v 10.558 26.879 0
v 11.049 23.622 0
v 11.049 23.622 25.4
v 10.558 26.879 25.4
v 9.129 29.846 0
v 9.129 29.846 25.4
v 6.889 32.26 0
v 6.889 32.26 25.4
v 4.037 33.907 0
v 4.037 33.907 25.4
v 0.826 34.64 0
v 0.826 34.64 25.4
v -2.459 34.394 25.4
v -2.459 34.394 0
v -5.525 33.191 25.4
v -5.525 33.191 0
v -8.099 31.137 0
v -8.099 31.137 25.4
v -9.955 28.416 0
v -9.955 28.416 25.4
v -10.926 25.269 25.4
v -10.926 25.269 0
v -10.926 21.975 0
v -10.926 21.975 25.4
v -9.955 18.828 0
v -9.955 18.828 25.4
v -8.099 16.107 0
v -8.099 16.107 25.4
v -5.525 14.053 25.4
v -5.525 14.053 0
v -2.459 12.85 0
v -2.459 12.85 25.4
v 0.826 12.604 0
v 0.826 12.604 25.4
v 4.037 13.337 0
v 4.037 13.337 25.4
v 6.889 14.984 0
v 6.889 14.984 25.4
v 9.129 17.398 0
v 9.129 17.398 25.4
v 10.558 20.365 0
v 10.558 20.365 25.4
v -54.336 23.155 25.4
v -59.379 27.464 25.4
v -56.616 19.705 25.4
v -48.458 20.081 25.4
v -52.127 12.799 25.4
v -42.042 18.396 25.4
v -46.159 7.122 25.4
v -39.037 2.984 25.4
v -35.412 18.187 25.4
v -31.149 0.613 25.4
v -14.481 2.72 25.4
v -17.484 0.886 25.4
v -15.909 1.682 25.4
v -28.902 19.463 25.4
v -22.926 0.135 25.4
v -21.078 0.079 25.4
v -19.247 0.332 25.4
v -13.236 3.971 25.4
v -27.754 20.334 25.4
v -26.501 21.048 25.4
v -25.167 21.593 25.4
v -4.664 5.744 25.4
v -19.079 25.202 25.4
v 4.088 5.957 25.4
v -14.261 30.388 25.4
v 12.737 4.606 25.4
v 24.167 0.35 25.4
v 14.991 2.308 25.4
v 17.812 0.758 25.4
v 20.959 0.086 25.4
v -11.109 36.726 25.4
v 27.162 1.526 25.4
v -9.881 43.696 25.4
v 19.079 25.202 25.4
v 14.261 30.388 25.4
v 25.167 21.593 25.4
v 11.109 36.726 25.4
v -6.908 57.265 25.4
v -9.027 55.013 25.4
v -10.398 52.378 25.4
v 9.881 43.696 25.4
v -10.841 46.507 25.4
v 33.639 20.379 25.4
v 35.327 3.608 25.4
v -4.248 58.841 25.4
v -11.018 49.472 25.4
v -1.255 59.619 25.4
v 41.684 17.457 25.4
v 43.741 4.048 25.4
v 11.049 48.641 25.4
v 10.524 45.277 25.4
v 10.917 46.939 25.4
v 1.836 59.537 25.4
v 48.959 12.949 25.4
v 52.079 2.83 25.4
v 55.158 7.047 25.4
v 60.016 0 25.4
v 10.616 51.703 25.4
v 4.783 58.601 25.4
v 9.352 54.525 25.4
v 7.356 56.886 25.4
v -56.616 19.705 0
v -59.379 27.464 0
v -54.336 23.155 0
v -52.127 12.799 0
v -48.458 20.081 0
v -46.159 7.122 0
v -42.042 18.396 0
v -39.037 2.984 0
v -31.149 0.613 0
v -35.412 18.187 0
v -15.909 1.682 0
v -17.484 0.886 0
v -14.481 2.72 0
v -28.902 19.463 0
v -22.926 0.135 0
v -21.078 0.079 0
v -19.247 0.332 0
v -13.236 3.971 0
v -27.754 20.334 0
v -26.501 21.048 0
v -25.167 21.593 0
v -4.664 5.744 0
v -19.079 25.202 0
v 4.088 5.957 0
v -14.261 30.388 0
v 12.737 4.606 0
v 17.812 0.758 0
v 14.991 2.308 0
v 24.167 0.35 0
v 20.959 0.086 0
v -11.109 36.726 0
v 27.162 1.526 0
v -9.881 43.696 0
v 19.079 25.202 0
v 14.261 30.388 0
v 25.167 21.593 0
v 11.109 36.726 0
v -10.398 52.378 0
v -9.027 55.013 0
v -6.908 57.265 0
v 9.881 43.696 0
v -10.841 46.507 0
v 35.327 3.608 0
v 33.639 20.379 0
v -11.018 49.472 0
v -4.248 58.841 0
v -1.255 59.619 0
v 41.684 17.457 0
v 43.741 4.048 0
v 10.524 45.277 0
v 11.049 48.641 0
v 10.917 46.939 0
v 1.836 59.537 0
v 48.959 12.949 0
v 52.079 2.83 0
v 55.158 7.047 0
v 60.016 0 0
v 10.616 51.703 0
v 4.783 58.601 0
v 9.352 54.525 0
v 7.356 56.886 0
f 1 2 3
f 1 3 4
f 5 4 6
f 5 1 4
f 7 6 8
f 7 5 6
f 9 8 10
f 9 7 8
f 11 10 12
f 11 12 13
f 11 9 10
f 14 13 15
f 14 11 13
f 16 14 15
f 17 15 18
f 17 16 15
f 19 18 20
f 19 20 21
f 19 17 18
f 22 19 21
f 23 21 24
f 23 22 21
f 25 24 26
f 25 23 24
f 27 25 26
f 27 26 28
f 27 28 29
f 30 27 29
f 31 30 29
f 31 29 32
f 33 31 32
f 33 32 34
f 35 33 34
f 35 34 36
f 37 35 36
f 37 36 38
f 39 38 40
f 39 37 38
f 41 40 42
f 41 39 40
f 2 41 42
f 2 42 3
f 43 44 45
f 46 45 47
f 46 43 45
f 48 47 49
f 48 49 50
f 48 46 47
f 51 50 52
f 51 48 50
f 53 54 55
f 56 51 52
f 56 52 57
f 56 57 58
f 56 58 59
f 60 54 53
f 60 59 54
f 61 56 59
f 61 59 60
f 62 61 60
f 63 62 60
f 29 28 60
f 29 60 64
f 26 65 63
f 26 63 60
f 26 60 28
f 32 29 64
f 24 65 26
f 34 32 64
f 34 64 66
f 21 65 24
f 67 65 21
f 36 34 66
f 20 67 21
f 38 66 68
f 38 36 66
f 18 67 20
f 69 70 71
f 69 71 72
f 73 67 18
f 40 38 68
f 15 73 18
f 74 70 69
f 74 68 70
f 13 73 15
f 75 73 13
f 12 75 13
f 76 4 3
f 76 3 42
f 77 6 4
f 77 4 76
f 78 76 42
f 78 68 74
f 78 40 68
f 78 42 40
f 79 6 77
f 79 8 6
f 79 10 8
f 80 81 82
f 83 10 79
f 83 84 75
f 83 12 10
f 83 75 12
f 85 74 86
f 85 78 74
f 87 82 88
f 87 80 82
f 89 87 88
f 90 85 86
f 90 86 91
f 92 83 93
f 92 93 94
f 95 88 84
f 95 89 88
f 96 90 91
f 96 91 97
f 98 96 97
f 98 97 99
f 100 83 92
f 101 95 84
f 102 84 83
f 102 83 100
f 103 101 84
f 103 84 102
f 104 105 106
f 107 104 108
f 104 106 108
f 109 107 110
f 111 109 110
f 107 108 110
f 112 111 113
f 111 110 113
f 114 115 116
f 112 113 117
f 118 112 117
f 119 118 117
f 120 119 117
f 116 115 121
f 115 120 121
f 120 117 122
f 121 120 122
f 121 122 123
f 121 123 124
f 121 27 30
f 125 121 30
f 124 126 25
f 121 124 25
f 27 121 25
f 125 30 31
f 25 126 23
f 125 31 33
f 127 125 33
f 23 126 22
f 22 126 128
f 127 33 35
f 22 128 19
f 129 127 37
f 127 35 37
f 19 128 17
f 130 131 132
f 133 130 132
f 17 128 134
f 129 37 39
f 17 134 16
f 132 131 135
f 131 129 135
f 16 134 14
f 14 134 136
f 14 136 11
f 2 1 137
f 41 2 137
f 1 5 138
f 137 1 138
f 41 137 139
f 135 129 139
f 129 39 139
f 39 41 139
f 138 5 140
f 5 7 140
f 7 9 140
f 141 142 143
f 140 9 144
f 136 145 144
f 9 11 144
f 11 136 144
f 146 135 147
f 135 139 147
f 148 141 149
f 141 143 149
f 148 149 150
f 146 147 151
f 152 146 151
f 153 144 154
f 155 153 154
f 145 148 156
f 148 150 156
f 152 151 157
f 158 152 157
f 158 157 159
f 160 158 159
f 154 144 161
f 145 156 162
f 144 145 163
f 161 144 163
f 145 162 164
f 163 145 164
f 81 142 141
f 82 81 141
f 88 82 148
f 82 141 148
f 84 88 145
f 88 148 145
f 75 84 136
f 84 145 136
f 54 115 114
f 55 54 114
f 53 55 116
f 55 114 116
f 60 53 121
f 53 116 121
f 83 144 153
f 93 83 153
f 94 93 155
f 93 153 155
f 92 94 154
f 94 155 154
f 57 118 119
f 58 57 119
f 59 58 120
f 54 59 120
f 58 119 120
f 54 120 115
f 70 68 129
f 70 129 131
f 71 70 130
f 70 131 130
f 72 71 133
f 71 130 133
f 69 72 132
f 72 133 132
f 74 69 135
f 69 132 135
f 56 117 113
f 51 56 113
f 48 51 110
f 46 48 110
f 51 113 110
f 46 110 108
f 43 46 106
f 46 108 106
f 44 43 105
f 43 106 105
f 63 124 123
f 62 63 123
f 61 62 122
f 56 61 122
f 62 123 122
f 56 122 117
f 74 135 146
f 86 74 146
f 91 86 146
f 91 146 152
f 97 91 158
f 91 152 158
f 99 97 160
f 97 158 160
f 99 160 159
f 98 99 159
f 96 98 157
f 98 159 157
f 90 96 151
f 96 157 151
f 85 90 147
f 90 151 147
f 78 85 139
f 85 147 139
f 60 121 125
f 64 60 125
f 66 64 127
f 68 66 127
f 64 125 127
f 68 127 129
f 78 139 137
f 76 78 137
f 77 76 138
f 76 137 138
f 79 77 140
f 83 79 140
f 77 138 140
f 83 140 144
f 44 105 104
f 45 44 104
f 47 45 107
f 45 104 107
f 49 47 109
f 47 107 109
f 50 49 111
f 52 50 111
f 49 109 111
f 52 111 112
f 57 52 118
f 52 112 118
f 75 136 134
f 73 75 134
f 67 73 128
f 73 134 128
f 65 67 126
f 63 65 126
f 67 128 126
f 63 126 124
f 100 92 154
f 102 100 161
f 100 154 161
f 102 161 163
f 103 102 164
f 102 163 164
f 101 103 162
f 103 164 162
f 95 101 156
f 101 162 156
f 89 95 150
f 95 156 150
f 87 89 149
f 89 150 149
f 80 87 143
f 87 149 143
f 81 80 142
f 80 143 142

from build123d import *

# Parameters (mm, degrees)
F0_R     = 11.049
F1_DEPTH = 25.4


with BuildPart() as f1:
    # F0 (on Top) → F1 (new body)
    with BuildSketch(Plane.XY):
        with BuildLine():
            ThreePointArc((9.880516, 43.696073), (10.752912, 46.100628), (11.049, 48.641354))
            ThreePointArc((11.049, 48.641354), (3.342308, 59.172706), (-9.026913, 55.012794))
            ThreePointArc((-9.026913, 55.012794), (-11.017702, 49.472403), (-9.880516, 43.696073))
            ThreePointArc((-9.880516, 43.696073), (0, 37.592354), (9.880516, 43.696073))
        make_face()
        with BuildLine():
            ThreePointArc((25.166727, 21.592547), (14.261351, 30.388211), (9.880516, 43.696073))
            ThreePointArc((9.880516, 43.696073), (0, 37.592354), (-9.880516, 43.696073))
            ThreePointArc((-9.880516, 43.696073), (-14.261351, 30.388211), (-25.166727, 21.592547))
            ThreePointArc((-25.166727, 21.592547), (-15.209211, 20.07738), (-10.618396, 11.112323))
            ThreePointArc((-10.618396, 11.112323), (-11.293541, 7.309228), (-13.236467, 3.970907))
            ThreePointArc((-13.236467, 3.970907), (-0.292561, 6.046929), (12.737323, 4.60585))
            ThreePointArc((12.737323, 4.60585), (12.750546, 17.636907), (25.166727, 21.592547))
        make_face()
        with Locations((0, 23.622)):
            Circle(F0_R, mode=Mode.SUBTRACT)
        with BuildLine():
            ThreePointArc((60.015514, 0), (45.437915, 15.390791), (25.166727, 21.592547))
            ThreePointArc((25.166727, 21.592547), (30.632453, 17.570508), (32.716396, 11.112323))
            ThreePointArc((32.716396, 11.112323), (31.227516, 5.572963), (27.162137, 1.526488))
            ThreePointArc((27.162137, 1.526488), (43.741463, 4.048326), (60.015514, 0))
        make_face()
        with BuildLine():
            ThreePointArc((32.716396, 11.112323), (30.632453, 17.570508), (25.166727, 21.592547))
            ThreePointArc((25.166727, 21.592547), (12.750546, 17.636907), (12.737323, 4.60585))
            ThreePointArc((12.737323, 4.60585), (19.360668, 0.306796), (27.162137, 1.526488))
            ThreePointArc((27.162137, 1.526488), (31.227516, 5.572963), (32.716396, 11.112323))
        make_face()
        with BuildLine():
            ThreePointArc((-10.618396, 11.112323), (-15.209211, 20.07738), (-25.166727, 21.592547))
            ThreePointArc((-25.166727, 21.592547), (-27.139076, 20.71134), (-28.902264, 19.463197))
            ThreePointArc((-28.902264, 19.463197), (-32.223312, 7.848423), (-22.92604, 0.135246))
            ThreePointArc((-22.92604, 0.135246), (-20.190383, 0.404429), (-17.484009, 0.885903))
            ThreePointArc((-17.484009, 0.885903), (-15.174357, 2.172477), (-13.236467, 3.970907))
            ThreePointArc((-13.236467, 3.970907), (-11.293541, 7.309228), (-10.618396, 11.112323))
        make_face()
        with BuildLine():
            ThreePointArc((-22.92604, 0.135246), (-32.223312, 7.848423), (-28.902264, 19.463197))
            ThreePointArc((-28.902264, 19.463197), (-45.297393, 19.057617), (-59.379004, 27.464341))
            ThreePointArc((-59.379004, 27.464341), (-46.159112, 7.121744), (-22.92604, 0.135246))
        make_face()
        with BuildLine():
            ThreePointArc((-17.484009, 0.885903), (-20.190383, 0.404429), (-22.92604, 0.135246))
            ThreePointArc((-22.92604, 0.135246), (-20.157627, 0.166959), (-17.484009, 0.885903))
        make_face()
    extrude(amount=F1_DEPTH)


solid = f1.part
